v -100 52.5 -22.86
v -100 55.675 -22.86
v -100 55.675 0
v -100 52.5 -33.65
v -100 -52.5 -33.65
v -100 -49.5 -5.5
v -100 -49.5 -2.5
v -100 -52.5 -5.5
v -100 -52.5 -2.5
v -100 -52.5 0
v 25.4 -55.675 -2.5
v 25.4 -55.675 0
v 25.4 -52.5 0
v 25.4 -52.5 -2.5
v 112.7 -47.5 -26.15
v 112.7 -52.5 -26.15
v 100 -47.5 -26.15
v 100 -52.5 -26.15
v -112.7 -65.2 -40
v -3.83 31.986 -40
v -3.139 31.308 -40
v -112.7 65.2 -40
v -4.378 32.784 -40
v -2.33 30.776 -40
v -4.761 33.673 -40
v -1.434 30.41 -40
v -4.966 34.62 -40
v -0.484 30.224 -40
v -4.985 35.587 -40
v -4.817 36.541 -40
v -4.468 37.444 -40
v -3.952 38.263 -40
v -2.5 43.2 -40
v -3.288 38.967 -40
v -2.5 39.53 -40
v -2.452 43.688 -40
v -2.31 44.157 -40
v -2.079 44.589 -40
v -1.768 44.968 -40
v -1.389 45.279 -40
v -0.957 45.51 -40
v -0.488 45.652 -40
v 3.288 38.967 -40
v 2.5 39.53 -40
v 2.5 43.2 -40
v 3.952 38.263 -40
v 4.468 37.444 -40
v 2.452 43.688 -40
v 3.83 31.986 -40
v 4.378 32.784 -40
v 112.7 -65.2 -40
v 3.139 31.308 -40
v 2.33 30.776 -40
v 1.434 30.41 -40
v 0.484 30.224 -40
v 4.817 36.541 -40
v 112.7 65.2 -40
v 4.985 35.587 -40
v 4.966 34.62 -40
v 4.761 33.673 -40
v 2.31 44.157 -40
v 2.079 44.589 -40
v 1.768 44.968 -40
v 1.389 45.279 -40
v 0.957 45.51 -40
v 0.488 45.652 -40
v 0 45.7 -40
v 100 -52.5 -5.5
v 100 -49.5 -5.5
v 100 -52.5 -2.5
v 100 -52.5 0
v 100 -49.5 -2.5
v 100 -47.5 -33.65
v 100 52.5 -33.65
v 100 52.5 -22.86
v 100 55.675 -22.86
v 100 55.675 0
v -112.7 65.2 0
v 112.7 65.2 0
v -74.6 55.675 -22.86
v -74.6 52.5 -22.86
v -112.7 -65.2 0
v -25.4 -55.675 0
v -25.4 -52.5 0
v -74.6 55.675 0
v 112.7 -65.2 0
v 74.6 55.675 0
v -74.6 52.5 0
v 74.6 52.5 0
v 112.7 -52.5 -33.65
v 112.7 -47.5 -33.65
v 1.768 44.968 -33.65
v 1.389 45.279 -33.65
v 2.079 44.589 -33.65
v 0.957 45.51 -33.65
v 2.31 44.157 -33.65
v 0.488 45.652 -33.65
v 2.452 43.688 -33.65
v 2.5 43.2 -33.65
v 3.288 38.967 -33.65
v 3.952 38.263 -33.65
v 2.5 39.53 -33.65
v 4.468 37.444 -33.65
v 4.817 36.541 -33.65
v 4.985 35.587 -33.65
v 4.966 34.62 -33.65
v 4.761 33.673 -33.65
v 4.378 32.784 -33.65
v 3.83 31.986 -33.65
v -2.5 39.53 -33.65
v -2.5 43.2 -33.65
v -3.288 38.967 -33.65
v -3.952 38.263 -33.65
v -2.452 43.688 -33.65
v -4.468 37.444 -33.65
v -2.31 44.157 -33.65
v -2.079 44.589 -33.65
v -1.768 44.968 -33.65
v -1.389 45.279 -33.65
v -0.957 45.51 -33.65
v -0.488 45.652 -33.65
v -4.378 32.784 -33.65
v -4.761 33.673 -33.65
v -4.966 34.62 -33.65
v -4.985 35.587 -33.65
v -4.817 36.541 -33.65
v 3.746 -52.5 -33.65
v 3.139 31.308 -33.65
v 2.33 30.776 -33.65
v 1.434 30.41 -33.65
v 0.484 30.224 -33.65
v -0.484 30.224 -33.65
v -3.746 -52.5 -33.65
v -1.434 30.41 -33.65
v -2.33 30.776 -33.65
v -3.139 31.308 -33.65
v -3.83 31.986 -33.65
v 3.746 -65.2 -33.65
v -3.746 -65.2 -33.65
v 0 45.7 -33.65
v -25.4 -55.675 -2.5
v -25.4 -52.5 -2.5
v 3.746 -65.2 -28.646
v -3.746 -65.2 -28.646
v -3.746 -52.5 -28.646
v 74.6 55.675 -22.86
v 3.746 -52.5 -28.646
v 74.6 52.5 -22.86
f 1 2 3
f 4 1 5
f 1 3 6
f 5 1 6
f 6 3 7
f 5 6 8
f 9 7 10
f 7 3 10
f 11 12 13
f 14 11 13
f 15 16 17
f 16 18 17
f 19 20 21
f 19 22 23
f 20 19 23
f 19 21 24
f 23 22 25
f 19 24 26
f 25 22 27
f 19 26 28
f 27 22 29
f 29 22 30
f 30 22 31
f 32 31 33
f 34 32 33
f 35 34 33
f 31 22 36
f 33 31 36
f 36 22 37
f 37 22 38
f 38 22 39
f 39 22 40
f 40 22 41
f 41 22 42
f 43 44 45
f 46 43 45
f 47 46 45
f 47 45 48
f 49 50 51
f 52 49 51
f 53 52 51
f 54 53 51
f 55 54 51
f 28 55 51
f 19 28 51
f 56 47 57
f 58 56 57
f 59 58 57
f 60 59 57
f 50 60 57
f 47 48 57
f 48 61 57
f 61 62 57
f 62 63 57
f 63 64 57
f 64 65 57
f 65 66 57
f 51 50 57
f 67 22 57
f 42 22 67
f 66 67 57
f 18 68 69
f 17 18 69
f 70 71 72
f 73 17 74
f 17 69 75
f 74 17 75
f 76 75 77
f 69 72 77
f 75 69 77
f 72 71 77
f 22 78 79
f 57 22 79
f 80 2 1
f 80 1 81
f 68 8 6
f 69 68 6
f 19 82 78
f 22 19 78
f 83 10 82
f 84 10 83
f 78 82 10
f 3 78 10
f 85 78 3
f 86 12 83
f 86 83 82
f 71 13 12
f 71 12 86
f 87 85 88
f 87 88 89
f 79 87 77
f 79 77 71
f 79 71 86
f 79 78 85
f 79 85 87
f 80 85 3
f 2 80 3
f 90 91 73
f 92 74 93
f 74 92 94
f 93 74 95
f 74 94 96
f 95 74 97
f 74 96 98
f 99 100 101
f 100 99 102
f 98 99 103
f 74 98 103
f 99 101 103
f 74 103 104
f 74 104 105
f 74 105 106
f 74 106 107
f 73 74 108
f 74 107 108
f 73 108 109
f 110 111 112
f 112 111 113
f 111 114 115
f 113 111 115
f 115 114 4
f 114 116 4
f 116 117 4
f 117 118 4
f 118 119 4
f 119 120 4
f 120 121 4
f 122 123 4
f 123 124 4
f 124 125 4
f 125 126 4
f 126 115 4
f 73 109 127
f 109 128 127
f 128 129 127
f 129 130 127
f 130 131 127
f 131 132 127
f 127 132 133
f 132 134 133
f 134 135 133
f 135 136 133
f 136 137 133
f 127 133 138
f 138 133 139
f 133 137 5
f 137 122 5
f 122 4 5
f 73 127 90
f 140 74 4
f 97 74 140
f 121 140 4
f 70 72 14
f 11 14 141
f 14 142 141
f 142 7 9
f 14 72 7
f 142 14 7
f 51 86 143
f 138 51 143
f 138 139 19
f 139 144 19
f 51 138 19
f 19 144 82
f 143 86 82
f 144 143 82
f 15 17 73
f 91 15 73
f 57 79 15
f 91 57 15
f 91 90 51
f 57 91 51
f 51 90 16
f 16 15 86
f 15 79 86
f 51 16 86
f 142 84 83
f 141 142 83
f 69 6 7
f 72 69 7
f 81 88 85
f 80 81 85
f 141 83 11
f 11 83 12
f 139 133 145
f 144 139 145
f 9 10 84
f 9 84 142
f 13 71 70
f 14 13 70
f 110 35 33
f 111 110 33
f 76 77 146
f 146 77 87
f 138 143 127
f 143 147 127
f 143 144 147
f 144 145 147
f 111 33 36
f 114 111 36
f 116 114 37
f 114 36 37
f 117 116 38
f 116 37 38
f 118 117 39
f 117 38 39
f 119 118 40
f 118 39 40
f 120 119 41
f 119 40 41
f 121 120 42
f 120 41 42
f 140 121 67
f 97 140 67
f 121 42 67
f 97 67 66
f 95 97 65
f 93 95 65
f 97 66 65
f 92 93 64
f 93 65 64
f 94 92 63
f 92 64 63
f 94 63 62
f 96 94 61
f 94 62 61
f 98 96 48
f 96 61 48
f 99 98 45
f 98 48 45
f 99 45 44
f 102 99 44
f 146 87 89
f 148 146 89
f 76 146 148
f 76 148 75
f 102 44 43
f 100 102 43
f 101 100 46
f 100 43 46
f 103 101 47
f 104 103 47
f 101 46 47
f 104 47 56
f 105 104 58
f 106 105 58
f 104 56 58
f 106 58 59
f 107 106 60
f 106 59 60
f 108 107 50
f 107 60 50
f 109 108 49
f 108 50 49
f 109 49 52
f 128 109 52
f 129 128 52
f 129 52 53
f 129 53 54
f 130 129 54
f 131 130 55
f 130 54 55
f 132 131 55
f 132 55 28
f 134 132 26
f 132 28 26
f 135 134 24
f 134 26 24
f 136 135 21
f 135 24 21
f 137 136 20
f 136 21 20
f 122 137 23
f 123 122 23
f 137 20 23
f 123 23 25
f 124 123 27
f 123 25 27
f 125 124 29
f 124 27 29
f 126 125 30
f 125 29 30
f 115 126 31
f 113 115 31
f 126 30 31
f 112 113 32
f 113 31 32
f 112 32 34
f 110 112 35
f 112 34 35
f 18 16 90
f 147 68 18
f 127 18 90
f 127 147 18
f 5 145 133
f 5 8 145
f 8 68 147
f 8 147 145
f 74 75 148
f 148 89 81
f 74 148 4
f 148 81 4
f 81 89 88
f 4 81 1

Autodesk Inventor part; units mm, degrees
ref_plane "YZ Plane" through (0, 0, 0) normal (1, 0, 0) x (0, 1, 0)
ref_plane "XZ Plane" through (0, 0, 0) normal (0, 1, 0) x (-1, 0, 0)
ref_plane "XY Plane" through (0, 0, 0) normal (0, 0, 1) x (1, 0, 0)
sketch "Sketch1" plane through (0, 0, 0) normal (0, 0, 1) x (1, 0, 0)
  line L0 (-100, -52.5) -> (100, -52.5)
  line L1 (100, -52.5) -> (100, 52.5)
  line L2 (100, 52.5) -> (-100, 52.5)
  line L3 (-100, 52.5) -> (-100, -52.5)
  line L4 (-100, -52.5) -> (100, 52.5) construction
  line L5 (100, -52.5) -> (-100, 52.5) construction
  line L6 (-112.7, 65.2) -> (112.7, 65.2)
  line L7 (112.7, 65.2) -> (112.7, -65.2)
  line L8 (112.7, -65.2) -> (-112.7, -65.2)
  line L9 (-112.7, -65.2) -> (-112.7, 65.2)
  point P0 (0, 0)
  dimension "d0" = 200
  dimension "d1" = 105
  dimension "d2" = 12.7
extrude "Extrusion1" add sketch "Sketch1" against normal blind 40
sketch "Sketch2" plane through (-100, 52.5, 0) normal (0, -1, 0) x (1, 0, 0)
  line L0 (200, -40) -> (0, -40) projected
  line L1 (0, 0) -> (0, -40) projected
  line L2 (200, -40) -> (0, -40)
  line L3 (0, -40) -> (0, -33.65)
  line L4 (0, -33.65) -> (200, -33.65)
  line L5 (200, -33.65) -> (200, -40)
  point P0 (100, 0)
  dimension "d5" = 6.35
extrude "Extrusion2" add sketch "Sketch2" along normal up to next
sketch "Sketch4" plane through (0, 0, -40) normal (0, 0, -1) x (-1, 0, 0)
  line L0 (112.7, 65.2) -> (-112.7, 65.2) projected
  line L1 (0, 65.2) -> (0, -65.2)
  line L2 (-112.7, -65.2) -> (112.7, -65.2) projected
  arc A0 (-2.5, 39.5301) -> (2.5, 39.5301) centre (0, 35.2) ccw
  line L3 (0, 35.2) -> (0, 43.2) construction
  line L4 (2.5, 39.5301) -> (2.5, 43.2)
  line L5 (-2.5, 43.2) -> (-2.5, 39.5301)
  arc A1 (2.5, 43.2) -> (-2.5, 43.2) centre (0, 43.2) ccw
  point P0 (0, 0)
  point P1 (0, 39.2)
  dimension "d14" = 10
  dimension "d15" = 5
  dimension "d17" = 30
  dimension "d18" = 8
extrude "Extrusion4" cut sketch "Sketch4" against normal through all
sketch "Sketch5" plane through (100, -52.5, 0) normal (-1, 0, 0) x (0, 0, 1)
  line L0 (-33.65, 105) -> (-33.65, 0) projected
  line L1 (0, 0) -> (-40, 0) projected
  line L2 (-33.65, 0) -> (-26.15, 0)
  line L3 (-26.15, 0) -> (-26.15, 5)
  line L4 (-26.15, 5) -> (-33.65, 5)
  line L5 (-33.65, 5) -> (-33.65, 0)
  point P0 (0, 52.5)
  dimension "d21" = 7.5
  dimension "d22" = 5
extrude "Extrusion5" cut sketch "Sketch5" against normal through all
sketch "Sketch6" plane through (-100, -52.5, 0) normal (1, 0, 0) x (0, 0, -1)
  line L0 (0, 0) -> (33.65, 0) projected
  line L1 (0, 0) -> (0, 105) projected
  line L2 (0, 105) -> (33.65, 105) projected
  line L3 (2.5, 0) -> (5.5, 0)
  line L4 (5.5, 0) -> (5.5, 3)
  line L5 (5.5, 3) -> (2.5, 3)
  line L6 (2.5, 3) -> (2.5, 0)
  point P0 (0, 52.5)
  point P1 (40, 0)
  point P2 (40, 105)
  dimension "d26" = 2.5
  dimension "d27" = 3
  dimension "d28" = 3
extrude "Extrusion6" add sketch "Sketch6" along normal up to next
sketch "Sketch7" plane through (0, 0, 0) normal (0, 0, 1) x (1, 0, 0)
  line L0 (112.7, -65.2) -> (-112.7, -65.2) projected
  line L1 (0, -65.2) -> (0, -52.5)
  line L2 (-100, -52.5) -> (112.7, -52.5) projected
  line L3 (-25.4, -55.675) -> (25.4, -55.675)
  line L4 (25.4, -55.675) -> (25.4, -52.5)
  line L5 (25.4, -52.5) -> (-25.4, -52.5)
  line L6 (-25.4, -52.5) -> (-25.4, -55.675)
  line L7 (-25.4, -55.675) -> (25.4, -52.5) construction
  line L8 (25.4, -55.675) -> (-25.4, -52.5) construction
  arc A0 (25.4, -55.675) -> (28.575, -52.5) centre (25.4, -52.5) ccw construction
  arc A1 (-28.575, -52.5) -> (-25.4, -55.675) centre (-25.4, -52.5) ccw construction
  point P0 (0, 0)
  point P1 (0, -54.0875)
  point P2 (100, -52.5)
  dimension "d32" = 50.8
  dimension "d33" = 3.175
extrude "Extrusion7" cut sketch "Sketch7" against normal up to surface (2.5 mm away)
sketch "Sketch8" plane through (0, 0, 0) normal (0, 0, 1) x (1, 0, 0)
  line L0 (-100, -52.5) -> (-100, 52.5) projected
  line L1 (-100, 52.5) -> (-74.6, 52.5)
  line L2 (-74.6, 52.5) -> (-74.6, 55.675)
  line L3 (-74.6, 55.675) -> (-100, 55.675)
  line L4 (-100, 55.675) -> (-100, 52.5)
  point P0 (0, 0)
  dimension "d36" = 25.4
  dimension "d37" = 3.175
extrude "Extrusion8" cut sketch "Sketch8" against normal blind 22.86
mirror "Mirror1" about plane through (0, 0, 0) normal (1, 0, 0) of "Extrusion8"
sketch "Sketch9" plane through (-100, -52.5, -33.65) normal (0, 1, 0) x (1, 0, 0)
  line L0 (0, 0) -> (212.7, 0) projected
  line L1 (96.2535, -5.0038) -> (103.7465, -5.0038)
  line L2 (103.7465, -5.0038) -> (103.7465, 0)
  line L3 (103.7465, 0) -> (96.2535, 0)
  line L4 (96.2535, 0) -> (96.2535, -5.0038)
  line L5 (212.7, 6.35) -> (-12.7, 6.35) projected
  line L6 (100, 6.35) -> (100, -33.65)
  line L7 (125.4, -33.65) -> (74.6, -33.65) projected
  point P0 (100, 0)
  point P1 (200, 0)
  dimension "d40" = 7.493
  dimension "d41" = 5.0038
extrude "Extrusion9" cut sketch "Sketch9" against normal through all
properties part number "housing"
